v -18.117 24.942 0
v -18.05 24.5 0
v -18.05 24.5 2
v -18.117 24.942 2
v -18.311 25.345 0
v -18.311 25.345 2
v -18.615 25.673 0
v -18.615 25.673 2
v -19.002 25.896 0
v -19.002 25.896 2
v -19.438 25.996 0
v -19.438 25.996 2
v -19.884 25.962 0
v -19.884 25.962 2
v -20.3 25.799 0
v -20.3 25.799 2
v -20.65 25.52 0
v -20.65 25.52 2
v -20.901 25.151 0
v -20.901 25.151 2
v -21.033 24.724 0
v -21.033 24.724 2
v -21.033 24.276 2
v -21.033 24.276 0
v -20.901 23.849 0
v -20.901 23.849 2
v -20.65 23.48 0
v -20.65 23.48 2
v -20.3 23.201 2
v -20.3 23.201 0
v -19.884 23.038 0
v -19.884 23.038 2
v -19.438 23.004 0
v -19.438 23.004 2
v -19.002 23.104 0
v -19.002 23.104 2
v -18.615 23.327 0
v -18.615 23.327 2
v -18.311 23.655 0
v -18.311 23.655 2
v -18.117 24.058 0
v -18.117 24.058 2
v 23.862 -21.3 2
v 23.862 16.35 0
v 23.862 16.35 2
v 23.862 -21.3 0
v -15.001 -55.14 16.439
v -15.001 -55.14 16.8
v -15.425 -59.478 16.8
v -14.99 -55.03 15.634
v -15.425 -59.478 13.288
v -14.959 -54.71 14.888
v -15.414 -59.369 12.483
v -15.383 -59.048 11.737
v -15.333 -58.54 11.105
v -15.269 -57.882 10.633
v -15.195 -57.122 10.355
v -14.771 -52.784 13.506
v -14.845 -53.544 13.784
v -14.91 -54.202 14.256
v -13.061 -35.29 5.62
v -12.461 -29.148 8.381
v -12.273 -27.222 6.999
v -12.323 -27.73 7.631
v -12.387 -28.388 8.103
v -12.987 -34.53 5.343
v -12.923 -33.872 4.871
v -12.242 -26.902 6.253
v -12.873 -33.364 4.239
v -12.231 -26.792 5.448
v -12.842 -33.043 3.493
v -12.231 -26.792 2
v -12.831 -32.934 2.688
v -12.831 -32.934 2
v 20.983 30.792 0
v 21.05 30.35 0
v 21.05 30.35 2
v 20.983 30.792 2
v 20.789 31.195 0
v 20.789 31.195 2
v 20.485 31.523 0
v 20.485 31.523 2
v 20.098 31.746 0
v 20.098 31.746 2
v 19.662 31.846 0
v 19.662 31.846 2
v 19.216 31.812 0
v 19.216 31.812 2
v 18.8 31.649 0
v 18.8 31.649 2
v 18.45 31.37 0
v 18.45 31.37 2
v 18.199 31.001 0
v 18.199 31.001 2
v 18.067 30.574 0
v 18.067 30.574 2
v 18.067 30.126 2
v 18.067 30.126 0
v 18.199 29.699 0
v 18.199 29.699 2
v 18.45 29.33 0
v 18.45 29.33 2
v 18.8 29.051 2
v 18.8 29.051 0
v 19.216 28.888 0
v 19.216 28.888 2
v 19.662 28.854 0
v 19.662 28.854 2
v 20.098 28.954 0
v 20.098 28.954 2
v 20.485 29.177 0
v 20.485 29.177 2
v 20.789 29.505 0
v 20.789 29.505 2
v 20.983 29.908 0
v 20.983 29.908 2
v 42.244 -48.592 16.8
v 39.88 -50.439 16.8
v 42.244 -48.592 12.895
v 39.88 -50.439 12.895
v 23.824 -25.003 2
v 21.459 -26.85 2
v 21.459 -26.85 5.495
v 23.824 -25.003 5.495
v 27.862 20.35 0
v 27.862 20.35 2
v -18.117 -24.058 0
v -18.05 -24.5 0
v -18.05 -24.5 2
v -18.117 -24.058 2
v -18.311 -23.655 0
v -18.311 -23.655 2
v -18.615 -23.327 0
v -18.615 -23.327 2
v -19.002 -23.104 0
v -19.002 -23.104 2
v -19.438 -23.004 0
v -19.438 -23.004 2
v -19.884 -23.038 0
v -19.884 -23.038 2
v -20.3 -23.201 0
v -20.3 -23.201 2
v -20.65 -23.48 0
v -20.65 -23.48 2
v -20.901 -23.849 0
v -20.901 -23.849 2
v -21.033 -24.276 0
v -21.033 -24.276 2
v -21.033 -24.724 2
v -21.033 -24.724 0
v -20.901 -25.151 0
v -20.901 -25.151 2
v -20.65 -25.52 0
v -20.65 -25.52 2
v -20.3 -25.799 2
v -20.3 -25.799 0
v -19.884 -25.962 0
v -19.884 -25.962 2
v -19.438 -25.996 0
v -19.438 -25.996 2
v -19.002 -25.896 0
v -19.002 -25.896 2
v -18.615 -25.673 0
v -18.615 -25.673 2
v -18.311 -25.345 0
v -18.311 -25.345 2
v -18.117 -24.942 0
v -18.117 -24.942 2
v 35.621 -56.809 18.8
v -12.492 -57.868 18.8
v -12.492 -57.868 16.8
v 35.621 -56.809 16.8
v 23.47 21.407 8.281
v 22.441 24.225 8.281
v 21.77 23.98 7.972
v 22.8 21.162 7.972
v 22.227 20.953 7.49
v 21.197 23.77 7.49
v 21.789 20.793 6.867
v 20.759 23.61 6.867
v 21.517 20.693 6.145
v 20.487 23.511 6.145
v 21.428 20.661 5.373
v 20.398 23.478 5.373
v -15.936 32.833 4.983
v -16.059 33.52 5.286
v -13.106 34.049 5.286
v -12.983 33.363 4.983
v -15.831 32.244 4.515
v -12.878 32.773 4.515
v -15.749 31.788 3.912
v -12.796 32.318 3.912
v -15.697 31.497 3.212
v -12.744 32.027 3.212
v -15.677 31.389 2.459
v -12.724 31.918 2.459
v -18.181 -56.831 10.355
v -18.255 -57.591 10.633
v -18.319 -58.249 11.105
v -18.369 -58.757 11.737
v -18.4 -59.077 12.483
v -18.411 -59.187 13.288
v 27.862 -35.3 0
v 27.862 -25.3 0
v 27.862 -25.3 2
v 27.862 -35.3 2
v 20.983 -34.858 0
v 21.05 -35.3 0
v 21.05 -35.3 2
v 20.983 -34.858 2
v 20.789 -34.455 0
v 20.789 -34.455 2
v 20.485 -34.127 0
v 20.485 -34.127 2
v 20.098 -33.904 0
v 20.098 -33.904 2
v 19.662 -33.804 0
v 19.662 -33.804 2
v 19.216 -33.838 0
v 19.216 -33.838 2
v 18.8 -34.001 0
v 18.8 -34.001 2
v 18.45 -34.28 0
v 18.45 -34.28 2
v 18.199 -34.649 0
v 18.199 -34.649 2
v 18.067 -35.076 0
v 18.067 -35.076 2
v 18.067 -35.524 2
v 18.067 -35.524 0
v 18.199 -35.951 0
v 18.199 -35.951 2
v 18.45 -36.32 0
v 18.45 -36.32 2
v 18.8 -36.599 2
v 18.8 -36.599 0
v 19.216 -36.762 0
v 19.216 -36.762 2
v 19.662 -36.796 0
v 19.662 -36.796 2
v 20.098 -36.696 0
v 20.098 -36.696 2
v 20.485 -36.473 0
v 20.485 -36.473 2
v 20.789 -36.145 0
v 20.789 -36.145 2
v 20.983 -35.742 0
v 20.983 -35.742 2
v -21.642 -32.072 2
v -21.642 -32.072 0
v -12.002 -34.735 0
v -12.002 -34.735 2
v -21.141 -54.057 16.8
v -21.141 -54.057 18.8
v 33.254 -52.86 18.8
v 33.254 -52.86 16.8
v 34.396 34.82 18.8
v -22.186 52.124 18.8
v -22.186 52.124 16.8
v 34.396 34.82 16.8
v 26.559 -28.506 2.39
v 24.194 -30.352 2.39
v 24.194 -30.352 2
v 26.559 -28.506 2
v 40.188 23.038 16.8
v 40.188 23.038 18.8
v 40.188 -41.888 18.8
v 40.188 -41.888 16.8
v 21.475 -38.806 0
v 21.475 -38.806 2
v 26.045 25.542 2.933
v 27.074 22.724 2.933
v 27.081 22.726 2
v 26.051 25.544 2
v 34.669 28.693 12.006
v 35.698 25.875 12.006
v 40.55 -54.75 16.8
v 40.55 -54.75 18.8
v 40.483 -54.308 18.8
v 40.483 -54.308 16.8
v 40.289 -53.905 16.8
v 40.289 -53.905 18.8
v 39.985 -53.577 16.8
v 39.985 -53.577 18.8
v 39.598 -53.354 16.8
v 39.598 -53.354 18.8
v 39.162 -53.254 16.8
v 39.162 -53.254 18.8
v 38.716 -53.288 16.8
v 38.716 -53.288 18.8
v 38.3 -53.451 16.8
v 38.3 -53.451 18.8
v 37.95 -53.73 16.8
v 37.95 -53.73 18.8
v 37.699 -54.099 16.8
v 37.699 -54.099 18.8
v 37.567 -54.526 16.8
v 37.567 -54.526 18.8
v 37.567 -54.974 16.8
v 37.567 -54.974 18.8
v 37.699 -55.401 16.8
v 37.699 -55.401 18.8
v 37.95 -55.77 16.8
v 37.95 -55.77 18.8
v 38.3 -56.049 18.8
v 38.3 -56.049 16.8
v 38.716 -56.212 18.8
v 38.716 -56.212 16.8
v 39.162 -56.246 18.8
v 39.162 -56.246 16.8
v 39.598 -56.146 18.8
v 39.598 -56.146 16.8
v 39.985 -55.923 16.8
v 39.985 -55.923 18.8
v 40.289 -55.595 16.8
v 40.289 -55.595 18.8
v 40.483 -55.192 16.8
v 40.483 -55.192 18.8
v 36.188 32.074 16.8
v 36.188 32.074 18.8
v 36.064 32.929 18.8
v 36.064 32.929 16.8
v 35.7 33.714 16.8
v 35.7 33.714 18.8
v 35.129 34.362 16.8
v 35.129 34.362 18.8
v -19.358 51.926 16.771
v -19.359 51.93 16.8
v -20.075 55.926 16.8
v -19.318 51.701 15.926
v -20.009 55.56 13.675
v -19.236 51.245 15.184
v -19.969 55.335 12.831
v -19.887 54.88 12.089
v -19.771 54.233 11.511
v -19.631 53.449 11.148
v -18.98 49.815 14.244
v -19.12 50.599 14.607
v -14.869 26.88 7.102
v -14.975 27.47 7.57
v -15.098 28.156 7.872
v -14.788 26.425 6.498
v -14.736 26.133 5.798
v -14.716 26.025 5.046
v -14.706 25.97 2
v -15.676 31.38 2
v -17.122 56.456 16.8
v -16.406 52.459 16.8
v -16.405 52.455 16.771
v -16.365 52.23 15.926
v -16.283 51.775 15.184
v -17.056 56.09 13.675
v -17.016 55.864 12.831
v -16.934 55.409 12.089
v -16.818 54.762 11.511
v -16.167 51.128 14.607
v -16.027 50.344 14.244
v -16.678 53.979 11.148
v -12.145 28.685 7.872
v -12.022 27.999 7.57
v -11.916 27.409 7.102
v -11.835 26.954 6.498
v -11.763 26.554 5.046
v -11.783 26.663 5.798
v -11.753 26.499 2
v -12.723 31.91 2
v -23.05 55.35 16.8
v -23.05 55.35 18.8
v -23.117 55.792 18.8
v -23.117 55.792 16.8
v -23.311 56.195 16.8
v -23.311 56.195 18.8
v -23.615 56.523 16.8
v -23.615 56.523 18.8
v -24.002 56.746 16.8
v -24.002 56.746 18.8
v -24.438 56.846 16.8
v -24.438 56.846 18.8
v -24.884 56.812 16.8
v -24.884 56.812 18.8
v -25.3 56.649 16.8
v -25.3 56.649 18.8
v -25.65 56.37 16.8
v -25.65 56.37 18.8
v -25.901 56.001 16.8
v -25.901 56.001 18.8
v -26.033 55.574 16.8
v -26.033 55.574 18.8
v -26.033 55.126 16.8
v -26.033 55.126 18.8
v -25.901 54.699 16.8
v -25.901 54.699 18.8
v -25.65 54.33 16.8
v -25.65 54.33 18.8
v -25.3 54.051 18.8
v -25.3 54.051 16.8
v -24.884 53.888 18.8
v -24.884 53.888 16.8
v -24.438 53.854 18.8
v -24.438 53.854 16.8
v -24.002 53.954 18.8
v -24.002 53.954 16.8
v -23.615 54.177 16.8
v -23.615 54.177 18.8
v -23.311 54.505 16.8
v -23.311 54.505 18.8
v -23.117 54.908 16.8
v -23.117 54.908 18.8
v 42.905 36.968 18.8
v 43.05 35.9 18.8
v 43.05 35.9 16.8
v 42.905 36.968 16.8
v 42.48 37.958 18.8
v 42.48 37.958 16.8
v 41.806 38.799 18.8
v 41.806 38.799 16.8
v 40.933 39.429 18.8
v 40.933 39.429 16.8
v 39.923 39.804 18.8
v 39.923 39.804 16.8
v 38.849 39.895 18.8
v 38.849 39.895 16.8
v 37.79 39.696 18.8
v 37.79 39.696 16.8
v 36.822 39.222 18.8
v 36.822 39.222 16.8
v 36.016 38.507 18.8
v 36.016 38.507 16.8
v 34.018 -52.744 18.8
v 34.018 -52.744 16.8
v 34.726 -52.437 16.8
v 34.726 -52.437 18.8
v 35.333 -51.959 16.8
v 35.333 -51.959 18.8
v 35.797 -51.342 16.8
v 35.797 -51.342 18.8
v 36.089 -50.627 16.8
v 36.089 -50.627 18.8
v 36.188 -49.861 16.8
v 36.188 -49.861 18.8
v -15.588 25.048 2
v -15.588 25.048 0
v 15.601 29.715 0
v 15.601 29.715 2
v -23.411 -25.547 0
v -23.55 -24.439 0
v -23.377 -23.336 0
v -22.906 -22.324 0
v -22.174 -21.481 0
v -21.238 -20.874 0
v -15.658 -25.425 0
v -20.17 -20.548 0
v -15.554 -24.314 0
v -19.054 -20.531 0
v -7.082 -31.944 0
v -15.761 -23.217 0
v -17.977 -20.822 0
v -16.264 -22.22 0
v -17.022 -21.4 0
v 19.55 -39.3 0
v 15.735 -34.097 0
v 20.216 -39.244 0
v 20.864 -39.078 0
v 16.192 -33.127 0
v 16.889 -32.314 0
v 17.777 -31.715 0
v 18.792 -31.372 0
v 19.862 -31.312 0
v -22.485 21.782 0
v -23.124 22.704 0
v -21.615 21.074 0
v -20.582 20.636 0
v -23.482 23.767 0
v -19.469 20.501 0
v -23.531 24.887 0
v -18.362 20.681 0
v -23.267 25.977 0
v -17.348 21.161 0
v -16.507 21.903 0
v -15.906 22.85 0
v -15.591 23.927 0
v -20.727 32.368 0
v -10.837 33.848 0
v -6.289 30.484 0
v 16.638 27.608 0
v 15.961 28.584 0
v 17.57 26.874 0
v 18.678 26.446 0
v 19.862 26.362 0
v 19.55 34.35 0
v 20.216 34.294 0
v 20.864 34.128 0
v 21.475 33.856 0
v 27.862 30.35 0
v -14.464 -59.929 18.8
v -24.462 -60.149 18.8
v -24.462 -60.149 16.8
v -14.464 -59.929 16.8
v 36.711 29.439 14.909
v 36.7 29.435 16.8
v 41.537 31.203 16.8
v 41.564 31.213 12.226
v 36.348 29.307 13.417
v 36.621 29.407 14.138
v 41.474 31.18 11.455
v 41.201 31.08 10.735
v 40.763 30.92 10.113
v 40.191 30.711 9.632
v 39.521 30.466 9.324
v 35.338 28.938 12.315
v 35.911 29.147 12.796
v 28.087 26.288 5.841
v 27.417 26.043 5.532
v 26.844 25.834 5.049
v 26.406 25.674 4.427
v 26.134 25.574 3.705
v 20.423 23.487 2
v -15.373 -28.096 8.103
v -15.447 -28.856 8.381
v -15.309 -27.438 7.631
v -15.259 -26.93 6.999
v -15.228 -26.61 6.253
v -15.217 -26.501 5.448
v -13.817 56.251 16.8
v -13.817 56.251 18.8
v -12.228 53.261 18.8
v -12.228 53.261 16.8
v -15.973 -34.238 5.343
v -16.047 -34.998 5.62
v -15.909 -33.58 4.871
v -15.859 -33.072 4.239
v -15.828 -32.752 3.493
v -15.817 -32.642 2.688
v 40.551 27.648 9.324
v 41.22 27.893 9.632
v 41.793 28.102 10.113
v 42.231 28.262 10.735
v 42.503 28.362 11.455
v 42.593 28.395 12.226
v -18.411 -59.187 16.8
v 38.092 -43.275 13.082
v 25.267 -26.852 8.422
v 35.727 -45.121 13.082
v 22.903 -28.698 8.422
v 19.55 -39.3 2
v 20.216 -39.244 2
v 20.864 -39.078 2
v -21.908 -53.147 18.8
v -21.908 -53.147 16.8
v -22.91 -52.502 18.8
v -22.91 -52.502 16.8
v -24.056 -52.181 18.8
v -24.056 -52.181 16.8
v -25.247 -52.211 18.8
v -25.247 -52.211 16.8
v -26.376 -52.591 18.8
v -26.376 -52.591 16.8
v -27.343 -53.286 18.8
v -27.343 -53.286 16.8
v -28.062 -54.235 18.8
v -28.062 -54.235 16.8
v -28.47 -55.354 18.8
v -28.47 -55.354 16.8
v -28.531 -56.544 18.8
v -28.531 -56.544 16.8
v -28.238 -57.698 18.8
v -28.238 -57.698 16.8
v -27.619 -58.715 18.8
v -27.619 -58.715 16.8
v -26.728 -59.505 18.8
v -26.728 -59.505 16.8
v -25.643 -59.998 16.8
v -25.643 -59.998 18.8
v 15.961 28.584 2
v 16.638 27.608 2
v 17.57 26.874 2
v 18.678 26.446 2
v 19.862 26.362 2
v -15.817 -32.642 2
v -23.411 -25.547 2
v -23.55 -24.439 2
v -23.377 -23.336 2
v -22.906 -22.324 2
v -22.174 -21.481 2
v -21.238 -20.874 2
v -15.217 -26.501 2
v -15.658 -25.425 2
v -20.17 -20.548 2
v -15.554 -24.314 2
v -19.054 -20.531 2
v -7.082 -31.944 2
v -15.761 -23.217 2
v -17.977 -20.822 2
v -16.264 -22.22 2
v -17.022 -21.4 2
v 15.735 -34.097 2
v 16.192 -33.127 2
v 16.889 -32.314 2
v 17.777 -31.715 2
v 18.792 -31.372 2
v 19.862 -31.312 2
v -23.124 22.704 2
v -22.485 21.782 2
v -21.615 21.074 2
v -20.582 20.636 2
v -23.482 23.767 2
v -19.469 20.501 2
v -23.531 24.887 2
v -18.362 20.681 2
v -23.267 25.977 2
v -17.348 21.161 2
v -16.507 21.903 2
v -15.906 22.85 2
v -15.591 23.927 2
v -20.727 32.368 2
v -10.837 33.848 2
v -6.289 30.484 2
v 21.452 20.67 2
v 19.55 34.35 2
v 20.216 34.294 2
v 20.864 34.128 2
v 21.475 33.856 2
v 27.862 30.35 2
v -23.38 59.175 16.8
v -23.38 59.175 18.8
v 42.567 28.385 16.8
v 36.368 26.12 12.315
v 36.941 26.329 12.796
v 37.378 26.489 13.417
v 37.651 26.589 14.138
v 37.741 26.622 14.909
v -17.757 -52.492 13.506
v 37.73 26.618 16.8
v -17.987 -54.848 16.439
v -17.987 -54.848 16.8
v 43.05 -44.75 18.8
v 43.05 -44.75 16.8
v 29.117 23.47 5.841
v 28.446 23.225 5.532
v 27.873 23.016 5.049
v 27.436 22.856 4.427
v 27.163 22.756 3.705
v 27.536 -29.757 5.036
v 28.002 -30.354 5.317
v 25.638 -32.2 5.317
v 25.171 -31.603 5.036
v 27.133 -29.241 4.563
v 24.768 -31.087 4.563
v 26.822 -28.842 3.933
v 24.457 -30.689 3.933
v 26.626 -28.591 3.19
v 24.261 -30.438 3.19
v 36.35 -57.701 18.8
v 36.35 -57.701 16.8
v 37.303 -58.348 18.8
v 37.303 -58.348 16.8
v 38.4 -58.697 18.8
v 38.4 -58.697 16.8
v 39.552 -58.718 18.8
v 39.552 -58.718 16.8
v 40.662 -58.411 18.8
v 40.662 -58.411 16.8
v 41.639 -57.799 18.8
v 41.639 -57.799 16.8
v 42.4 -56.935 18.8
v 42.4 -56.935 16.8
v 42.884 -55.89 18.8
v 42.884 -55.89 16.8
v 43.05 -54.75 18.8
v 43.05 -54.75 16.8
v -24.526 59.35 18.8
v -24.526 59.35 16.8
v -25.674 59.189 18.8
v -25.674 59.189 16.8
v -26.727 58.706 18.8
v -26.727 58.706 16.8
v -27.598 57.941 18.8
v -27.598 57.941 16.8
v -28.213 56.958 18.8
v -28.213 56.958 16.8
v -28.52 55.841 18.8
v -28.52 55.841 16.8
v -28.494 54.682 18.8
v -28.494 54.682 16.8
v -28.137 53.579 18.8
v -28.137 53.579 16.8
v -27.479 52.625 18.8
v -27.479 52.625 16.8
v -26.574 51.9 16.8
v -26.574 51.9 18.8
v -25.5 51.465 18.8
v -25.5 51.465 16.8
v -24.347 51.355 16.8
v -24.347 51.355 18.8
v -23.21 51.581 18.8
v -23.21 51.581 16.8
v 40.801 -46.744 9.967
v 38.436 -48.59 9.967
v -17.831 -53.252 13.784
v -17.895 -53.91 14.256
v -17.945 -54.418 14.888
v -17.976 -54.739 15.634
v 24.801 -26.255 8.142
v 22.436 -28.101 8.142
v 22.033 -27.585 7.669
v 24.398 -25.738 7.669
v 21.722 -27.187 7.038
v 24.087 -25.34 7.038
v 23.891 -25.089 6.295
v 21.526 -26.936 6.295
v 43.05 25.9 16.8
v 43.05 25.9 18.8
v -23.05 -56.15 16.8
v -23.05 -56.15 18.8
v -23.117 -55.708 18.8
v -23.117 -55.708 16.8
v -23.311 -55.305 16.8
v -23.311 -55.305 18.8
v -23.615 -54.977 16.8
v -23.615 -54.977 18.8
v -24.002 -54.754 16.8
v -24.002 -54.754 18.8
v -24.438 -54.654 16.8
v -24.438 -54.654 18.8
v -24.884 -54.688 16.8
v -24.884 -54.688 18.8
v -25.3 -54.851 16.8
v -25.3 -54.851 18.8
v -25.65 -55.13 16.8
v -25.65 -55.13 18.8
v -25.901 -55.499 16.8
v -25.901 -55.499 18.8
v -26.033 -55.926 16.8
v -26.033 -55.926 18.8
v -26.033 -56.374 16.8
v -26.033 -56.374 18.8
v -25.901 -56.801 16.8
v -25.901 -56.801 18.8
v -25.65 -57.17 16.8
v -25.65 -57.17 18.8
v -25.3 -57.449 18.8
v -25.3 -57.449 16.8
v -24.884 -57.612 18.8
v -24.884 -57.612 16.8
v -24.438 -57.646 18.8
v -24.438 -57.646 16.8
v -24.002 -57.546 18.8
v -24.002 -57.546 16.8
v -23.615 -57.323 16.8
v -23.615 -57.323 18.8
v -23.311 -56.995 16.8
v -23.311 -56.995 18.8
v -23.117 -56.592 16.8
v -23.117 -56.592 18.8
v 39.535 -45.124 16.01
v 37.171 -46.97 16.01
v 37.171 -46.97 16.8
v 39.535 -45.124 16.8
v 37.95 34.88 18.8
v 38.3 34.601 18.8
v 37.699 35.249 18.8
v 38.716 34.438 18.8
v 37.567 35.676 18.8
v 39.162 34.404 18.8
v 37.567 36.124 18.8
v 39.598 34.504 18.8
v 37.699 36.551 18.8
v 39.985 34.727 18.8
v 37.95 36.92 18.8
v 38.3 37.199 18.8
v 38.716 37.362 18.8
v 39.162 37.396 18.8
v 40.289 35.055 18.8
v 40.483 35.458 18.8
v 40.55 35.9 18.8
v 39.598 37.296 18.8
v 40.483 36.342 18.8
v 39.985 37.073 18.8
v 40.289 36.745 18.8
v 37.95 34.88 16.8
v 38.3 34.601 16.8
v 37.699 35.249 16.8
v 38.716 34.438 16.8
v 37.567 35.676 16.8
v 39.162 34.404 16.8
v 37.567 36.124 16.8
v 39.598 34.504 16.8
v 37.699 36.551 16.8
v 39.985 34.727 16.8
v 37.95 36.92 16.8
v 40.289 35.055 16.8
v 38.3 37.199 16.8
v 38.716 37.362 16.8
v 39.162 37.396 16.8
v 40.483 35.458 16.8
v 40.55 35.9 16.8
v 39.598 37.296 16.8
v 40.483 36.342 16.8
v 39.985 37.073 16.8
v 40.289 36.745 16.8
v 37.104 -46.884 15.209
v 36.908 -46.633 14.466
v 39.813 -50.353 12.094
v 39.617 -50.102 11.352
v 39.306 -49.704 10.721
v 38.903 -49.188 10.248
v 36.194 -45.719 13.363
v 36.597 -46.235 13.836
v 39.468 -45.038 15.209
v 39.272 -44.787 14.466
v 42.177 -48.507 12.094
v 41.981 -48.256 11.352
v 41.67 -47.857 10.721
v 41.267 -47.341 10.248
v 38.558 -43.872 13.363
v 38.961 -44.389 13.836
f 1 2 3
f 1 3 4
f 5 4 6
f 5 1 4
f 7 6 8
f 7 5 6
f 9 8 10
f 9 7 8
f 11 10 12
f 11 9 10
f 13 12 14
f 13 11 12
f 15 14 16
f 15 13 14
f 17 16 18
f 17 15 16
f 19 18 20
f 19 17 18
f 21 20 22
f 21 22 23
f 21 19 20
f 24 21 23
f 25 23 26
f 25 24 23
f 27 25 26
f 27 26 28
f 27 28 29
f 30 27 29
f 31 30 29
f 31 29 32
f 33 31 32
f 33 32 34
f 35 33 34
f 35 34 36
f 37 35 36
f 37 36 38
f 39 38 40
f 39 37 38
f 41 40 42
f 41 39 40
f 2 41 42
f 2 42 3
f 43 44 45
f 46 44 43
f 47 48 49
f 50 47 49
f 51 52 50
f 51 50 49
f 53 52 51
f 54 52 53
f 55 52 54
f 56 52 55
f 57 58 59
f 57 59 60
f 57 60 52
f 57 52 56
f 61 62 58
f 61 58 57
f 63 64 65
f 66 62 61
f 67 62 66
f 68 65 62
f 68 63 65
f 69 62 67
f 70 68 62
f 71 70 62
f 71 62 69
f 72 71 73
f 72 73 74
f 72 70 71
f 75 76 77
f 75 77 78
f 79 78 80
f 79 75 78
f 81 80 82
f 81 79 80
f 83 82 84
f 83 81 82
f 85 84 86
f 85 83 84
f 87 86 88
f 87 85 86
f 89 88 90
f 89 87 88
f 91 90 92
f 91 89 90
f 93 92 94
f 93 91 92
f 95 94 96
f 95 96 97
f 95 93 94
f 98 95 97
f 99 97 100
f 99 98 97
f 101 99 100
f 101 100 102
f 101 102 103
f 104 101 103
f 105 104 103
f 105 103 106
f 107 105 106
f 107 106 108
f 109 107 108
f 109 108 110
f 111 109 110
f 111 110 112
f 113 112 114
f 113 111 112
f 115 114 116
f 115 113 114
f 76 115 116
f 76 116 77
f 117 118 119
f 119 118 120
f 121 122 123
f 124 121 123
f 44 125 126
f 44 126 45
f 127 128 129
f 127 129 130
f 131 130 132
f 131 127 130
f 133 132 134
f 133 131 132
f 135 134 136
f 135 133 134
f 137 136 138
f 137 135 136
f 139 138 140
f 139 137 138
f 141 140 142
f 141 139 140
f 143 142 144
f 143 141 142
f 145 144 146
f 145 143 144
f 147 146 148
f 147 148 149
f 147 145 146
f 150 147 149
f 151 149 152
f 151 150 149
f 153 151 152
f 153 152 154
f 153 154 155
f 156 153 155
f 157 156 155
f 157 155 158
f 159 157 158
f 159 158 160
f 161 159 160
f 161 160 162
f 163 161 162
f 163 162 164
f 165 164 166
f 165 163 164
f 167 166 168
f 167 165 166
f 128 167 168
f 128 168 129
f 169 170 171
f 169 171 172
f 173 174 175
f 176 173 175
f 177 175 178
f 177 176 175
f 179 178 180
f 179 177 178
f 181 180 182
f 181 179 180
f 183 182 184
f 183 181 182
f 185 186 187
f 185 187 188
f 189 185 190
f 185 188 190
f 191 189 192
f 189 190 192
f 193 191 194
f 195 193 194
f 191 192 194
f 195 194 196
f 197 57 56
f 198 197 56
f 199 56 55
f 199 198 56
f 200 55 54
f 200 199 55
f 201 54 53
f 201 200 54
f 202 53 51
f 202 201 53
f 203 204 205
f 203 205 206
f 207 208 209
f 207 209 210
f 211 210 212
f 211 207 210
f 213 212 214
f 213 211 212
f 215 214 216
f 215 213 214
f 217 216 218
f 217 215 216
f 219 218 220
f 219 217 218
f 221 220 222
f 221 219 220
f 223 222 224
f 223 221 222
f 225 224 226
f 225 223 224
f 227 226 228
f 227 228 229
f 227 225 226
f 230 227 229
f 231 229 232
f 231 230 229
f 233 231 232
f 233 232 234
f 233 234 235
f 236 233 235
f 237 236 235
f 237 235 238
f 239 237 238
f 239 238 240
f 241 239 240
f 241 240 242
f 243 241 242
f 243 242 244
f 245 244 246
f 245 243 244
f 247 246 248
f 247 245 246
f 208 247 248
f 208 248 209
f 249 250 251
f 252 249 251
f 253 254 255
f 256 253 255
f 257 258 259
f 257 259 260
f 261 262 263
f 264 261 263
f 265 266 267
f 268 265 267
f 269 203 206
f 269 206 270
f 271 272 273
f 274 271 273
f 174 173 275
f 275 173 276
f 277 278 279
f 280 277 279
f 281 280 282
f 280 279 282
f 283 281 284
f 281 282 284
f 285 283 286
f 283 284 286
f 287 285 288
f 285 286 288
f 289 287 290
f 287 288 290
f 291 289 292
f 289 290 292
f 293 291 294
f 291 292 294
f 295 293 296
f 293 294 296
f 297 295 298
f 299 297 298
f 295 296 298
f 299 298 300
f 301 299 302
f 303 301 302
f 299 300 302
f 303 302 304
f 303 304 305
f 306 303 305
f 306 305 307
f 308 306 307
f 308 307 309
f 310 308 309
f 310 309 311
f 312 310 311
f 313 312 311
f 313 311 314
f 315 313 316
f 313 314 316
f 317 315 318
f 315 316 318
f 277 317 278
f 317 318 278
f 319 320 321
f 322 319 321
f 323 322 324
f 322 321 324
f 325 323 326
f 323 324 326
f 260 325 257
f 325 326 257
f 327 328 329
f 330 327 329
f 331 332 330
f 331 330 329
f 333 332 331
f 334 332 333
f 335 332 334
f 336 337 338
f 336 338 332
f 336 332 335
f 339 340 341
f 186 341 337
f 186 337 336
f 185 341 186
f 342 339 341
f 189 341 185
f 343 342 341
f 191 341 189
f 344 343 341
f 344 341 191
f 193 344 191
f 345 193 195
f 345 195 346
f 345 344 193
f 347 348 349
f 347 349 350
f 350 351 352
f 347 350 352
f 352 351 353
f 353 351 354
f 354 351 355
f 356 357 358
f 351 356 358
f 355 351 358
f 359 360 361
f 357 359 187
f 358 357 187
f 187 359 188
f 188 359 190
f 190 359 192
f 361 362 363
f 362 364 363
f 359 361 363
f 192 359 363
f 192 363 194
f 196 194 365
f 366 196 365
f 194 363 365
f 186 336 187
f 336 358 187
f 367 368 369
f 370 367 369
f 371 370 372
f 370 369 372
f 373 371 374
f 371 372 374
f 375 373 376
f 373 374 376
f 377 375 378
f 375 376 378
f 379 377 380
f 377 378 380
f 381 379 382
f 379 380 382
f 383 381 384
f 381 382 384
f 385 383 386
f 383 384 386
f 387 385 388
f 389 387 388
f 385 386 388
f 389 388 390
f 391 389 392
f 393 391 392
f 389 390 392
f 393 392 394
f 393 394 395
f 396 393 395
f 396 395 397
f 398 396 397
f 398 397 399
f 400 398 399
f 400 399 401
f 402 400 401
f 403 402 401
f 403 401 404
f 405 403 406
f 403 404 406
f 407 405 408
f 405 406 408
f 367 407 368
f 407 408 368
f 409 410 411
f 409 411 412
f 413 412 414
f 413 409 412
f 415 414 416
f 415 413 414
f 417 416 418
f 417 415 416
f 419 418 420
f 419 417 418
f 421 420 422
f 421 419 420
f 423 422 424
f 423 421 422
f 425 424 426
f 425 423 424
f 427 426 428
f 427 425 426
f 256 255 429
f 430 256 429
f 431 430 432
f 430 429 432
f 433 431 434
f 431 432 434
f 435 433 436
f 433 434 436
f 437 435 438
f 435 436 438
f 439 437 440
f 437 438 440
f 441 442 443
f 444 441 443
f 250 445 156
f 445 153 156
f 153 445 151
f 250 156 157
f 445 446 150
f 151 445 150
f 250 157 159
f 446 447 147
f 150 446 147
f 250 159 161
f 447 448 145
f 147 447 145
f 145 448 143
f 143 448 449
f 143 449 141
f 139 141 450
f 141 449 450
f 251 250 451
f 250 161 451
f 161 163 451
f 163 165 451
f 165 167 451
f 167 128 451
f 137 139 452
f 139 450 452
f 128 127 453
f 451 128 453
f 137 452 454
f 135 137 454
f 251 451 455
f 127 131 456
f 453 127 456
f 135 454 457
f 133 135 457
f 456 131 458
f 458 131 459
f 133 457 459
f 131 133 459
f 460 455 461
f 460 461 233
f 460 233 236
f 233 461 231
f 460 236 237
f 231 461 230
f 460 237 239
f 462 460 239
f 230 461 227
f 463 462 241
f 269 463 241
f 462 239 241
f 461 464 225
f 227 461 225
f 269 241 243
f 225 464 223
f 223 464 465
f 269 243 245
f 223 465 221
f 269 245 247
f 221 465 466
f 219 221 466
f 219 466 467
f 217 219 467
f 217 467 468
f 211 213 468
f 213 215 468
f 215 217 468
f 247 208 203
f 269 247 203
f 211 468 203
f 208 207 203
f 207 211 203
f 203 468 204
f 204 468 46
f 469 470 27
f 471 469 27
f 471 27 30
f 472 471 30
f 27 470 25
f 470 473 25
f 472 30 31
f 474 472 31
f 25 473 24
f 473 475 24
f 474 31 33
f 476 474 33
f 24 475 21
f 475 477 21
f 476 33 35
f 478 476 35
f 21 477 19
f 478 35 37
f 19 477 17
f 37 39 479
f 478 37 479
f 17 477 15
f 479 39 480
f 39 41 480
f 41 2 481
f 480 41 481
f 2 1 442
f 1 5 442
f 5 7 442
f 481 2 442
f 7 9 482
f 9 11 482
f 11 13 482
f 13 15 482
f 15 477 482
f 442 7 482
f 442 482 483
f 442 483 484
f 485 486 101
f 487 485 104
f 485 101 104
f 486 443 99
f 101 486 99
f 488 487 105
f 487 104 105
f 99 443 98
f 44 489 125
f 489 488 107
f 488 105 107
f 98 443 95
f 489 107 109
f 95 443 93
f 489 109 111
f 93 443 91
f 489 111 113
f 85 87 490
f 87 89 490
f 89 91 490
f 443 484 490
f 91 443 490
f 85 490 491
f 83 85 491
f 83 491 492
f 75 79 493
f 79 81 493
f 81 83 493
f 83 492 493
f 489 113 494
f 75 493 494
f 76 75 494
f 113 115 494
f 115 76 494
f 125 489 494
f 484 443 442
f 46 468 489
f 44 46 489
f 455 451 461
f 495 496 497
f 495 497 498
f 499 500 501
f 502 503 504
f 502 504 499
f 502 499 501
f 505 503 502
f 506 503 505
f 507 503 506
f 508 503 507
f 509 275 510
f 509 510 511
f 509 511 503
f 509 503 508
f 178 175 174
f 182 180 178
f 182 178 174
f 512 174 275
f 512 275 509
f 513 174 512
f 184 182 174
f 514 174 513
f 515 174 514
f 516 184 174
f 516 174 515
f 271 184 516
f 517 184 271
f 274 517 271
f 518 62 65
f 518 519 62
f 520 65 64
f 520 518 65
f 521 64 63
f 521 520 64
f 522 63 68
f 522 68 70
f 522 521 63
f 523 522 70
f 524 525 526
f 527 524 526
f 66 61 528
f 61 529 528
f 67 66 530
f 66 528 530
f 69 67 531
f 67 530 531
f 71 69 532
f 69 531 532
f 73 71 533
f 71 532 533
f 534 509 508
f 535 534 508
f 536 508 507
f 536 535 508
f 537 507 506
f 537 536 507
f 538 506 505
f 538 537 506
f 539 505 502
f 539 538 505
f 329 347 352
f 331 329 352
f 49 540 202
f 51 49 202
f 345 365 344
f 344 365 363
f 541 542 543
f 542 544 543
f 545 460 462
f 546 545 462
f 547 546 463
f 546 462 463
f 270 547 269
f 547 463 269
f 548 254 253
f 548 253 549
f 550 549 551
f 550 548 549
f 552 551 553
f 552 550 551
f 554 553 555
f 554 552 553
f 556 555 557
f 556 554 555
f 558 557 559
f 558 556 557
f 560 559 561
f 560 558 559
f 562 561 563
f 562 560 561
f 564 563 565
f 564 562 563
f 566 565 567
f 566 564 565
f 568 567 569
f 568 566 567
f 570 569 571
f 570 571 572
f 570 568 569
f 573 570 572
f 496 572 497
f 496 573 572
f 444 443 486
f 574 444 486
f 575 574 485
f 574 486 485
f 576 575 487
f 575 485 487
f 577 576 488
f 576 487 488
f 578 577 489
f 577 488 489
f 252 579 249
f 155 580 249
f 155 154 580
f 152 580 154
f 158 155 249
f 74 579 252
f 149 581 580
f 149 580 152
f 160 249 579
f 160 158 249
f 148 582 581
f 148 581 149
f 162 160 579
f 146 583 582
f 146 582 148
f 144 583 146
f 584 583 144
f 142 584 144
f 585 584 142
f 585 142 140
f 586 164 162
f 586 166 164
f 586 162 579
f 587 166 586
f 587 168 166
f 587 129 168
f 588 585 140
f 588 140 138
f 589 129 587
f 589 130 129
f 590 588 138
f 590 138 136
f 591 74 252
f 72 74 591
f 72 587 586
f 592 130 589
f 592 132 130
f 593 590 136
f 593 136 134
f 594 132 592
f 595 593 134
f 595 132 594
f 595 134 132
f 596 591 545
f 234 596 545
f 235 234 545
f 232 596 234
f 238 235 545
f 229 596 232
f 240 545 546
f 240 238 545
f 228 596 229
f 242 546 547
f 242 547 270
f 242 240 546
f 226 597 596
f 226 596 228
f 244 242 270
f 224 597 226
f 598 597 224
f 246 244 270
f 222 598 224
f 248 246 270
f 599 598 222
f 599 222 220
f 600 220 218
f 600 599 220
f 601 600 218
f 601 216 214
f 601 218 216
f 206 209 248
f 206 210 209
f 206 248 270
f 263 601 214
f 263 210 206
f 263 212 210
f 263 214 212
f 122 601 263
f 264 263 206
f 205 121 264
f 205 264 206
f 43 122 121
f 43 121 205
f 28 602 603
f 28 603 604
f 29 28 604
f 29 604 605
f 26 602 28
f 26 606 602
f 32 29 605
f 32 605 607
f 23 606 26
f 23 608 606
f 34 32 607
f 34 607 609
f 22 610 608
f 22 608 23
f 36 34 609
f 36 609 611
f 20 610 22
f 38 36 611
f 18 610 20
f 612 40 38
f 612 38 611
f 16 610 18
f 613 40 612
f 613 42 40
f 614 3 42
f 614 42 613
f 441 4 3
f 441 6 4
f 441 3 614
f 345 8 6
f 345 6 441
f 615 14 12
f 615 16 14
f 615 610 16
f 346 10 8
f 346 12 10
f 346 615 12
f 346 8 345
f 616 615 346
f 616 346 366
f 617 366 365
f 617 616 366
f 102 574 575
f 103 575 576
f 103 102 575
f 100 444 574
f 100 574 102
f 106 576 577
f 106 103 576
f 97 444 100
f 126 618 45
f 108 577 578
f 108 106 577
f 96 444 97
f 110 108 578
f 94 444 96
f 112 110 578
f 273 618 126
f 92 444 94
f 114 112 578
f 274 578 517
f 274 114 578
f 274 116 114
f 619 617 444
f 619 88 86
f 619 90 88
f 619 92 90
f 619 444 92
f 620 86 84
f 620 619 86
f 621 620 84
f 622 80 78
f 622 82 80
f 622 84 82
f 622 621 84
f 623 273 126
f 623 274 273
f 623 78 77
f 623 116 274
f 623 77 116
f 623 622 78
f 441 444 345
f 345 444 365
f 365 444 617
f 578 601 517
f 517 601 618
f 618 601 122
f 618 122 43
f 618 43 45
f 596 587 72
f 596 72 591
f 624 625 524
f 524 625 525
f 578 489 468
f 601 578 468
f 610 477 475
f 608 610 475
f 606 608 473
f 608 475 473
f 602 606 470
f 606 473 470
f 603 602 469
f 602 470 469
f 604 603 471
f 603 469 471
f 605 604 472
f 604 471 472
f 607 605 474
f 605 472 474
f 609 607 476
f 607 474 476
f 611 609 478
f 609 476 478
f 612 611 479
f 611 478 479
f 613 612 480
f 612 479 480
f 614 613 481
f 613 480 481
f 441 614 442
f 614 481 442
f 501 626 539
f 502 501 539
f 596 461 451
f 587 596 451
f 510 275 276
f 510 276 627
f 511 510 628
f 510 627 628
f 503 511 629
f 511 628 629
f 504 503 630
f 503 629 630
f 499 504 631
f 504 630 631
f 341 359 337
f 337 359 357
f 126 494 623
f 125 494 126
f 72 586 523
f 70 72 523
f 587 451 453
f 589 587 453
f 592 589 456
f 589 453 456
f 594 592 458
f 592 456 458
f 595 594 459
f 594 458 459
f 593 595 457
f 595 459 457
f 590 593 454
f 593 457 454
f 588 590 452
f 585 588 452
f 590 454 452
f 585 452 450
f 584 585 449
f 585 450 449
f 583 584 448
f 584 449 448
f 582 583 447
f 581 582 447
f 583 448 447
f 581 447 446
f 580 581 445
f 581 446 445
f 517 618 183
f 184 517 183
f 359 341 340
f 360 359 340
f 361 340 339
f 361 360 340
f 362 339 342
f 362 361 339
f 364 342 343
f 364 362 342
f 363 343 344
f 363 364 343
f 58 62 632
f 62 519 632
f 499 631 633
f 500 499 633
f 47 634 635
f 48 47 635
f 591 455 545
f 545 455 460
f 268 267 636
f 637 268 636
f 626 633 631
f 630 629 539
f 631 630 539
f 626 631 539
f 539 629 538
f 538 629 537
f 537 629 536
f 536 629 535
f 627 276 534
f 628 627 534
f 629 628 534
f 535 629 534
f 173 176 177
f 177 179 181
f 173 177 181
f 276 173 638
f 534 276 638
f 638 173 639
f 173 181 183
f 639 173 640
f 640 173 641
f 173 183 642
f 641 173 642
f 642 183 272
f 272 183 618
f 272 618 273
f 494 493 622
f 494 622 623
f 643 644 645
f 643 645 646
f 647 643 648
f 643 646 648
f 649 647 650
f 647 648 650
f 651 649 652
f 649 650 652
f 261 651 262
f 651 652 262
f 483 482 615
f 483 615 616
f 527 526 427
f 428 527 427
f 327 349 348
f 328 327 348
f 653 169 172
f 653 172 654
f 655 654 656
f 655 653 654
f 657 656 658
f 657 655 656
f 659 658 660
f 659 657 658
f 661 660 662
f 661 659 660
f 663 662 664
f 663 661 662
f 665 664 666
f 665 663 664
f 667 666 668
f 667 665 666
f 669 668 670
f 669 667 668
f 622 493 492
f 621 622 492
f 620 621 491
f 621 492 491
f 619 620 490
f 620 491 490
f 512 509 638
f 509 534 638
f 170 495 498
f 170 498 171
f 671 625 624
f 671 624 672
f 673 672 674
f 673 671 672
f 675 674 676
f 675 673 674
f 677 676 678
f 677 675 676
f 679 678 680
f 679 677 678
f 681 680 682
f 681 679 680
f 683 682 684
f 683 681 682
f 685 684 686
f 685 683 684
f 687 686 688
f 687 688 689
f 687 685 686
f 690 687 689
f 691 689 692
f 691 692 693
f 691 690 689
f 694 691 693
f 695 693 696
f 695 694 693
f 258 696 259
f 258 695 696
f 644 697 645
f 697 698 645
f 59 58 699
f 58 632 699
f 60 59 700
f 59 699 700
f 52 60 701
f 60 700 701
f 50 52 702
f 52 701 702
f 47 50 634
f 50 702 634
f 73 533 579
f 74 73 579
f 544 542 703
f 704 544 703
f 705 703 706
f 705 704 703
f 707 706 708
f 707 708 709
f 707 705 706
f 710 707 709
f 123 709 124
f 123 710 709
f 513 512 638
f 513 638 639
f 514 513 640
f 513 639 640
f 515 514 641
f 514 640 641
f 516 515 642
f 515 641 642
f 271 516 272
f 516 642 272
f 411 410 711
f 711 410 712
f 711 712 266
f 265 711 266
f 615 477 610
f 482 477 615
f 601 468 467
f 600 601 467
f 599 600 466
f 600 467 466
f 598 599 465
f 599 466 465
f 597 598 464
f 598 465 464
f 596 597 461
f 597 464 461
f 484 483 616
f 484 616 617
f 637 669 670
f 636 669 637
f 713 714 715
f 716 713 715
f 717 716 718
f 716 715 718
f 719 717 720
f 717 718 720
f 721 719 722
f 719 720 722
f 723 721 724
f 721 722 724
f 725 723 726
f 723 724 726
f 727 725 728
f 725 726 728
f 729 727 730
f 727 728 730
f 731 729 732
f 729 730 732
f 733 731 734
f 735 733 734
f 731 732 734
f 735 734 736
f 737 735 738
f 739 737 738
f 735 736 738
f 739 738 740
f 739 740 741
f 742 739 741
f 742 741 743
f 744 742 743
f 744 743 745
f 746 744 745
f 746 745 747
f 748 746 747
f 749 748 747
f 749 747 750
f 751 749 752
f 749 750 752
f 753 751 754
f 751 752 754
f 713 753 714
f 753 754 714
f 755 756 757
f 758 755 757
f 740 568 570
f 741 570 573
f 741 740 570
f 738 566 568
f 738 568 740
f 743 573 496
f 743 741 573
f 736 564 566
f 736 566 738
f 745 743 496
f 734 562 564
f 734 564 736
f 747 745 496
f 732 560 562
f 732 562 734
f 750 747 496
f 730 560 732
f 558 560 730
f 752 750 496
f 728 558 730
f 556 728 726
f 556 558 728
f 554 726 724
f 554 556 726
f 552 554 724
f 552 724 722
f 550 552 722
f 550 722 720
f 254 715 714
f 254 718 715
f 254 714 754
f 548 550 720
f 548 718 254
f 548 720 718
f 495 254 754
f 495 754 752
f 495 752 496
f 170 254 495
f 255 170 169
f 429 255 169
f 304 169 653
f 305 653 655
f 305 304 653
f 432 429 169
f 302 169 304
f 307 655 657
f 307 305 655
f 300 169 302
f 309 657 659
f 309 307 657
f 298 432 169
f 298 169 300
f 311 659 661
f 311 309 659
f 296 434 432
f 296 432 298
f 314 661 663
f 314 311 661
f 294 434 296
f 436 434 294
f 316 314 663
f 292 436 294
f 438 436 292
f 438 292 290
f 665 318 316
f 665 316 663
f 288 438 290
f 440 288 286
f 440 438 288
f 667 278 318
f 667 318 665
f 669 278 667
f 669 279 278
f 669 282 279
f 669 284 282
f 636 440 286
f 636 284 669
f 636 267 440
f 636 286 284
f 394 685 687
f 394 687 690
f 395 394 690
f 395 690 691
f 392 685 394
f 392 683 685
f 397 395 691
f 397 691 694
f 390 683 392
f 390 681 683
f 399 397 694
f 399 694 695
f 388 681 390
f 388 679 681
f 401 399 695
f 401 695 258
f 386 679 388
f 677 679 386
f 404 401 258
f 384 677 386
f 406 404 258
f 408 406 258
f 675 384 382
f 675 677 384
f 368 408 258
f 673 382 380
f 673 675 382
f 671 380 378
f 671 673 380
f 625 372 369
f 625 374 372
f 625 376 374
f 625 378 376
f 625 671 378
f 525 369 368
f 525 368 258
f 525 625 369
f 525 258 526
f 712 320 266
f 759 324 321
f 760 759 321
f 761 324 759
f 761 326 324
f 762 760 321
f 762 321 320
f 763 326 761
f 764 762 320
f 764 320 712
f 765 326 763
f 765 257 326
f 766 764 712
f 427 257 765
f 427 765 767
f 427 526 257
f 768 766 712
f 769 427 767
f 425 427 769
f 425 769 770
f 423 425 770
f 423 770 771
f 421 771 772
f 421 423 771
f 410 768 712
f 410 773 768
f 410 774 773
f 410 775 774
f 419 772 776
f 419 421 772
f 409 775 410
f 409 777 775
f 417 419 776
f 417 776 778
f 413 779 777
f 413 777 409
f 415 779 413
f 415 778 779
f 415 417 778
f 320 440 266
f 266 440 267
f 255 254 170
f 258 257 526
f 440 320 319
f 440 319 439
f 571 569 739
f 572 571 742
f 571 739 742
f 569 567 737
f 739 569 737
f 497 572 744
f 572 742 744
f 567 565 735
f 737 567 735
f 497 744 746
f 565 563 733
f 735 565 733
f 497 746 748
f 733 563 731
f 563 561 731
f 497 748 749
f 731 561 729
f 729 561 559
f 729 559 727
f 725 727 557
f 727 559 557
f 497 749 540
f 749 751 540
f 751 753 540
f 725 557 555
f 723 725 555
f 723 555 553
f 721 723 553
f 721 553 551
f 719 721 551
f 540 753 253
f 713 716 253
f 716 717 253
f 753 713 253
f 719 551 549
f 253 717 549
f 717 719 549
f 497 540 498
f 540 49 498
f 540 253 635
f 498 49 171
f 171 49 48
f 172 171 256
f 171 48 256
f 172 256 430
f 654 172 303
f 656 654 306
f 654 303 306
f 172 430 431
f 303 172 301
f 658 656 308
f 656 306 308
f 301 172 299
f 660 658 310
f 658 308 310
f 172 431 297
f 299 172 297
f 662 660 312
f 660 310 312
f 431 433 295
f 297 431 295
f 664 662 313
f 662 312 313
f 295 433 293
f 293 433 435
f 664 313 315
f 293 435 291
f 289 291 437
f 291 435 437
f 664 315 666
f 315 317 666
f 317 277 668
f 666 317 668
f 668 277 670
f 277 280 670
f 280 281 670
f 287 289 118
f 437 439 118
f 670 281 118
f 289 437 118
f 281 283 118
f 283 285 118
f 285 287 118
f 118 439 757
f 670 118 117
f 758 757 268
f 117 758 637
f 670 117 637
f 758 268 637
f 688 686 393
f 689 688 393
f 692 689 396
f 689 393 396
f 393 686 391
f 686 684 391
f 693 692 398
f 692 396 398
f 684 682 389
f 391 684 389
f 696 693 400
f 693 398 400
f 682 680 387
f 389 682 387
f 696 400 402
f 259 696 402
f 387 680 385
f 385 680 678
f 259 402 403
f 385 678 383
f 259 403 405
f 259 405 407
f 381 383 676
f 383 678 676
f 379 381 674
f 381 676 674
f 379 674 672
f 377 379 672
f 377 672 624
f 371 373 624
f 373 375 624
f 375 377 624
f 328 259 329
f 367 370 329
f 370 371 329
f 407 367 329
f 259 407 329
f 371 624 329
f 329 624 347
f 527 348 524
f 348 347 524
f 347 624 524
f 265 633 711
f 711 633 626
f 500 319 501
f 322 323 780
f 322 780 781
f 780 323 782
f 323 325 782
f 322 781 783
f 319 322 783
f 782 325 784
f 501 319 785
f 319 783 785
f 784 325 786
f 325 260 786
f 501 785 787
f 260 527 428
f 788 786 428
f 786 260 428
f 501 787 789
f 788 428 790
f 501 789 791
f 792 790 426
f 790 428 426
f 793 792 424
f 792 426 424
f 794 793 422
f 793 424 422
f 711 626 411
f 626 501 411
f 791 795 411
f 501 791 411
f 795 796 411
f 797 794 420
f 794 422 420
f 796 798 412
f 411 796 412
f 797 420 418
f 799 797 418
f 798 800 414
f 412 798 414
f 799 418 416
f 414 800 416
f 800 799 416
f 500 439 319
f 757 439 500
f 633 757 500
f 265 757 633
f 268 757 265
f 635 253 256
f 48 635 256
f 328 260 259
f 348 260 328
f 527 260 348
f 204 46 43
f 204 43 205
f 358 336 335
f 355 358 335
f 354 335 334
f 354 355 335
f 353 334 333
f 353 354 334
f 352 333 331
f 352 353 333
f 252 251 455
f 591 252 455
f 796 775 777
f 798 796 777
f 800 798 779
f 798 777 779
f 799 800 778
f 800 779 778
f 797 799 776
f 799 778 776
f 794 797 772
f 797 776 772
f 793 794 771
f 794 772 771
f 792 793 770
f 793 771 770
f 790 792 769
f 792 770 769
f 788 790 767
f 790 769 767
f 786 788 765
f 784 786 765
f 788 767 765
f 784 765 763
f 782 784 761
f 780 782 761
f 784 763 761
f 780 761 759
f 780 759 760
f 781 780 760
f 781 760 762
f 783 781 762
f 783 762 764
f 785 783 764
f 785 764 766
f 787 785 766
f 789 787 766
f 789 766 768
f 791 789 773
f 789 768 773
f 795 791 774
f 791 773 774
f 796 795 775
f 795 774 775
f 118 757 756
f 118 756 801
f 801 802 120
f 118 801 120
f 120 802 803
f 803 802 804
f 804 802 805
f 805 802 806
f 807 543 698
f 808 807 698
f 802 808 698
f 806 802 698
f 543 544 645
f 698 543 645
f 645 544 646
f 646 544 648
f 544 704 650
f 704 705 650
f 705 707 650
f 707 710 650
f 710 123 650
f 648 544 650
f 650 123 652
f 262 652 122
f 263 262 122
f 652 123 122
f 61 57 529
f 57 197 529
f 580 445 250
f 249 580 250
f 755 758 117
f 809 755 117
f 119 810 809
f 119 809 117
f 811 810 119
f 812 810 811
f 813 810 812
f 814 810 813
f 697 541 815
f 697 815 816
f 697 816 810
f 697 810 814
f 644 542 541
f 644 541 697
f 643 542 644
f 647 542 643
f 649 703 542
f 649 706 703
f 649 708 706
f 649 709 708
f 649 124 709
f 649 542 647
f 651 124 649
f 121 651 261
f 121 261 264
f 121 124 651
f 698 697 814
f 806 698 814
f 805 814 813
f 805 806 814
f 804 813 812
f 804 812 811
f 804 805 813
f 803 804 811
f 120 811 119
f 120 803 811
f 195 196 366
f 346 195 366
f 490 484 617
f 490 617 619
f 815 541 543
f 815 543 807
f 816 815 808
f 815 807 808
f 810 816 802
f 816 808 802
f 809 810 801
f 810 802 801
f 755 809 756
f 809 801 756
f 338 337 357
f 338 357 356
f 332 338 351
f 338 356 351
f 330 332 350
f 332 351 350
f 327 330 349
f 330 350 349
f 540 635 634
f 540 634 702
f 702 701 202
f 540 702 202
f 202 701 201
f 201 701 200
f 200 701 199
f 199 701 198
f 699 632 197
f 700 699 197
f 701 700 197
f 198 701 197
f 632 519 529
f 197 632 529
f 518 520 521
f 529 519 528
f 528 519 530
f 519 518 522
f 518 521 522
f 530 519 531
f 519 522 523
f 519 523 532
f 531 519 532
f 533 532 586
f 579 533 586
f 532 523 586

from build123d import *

# Parameters (mm, degrees)
PAD005_DEPTH = 1.5
PAD004_DEPTH = 1.5
PAD003_DEPTH = 1.5
PAD002_DEPTH = 1.5
SKETCH001_R  = 1.5
PAD001_DEPTH = 2
SKETCH_R     = 1.5
PAD_DEPTH    = 2


with BuildPart() as body005:
    # Sketch007 (on DatumPlane) → Pad005 (new body, symmetric)
    with BuildSketch(Plane(origin=(-16.952542, -59.685824, 18.8), x_dir=(0.053778, 0.550339, 0.833207), z_dir=(-0.99526, 0.097254, 0))):
        with BuildLine():
            Line((4.207597, 37.049782), (7.231669, 35.042847))
            ThreePointArc((8.366132, 31.449048), (8.433631, 33.446315), (7.231669, 35.042847))
            Line((8.366132, 31.449048), (-0.494965, 8.82738))
            ThreePointArc((-0.494965, 8.82738), (-0.562464, 6.830114), (0.639498, 5.233582))
            Line((0.639498, 5.233582), (1.08157, 4.940199))
            Line((1.08157, 4.940199), (-1.328872, 1.308117))
            Line((-1.328872, 1.308117), (-4.396585, 3.344014))
            ThreePointArc((-5.531049, 6.937813), (-5.598548, 4.940547), (-4.396585, 3.344014))
            Line((-5.531049, 6.937813), (2.654091, 27.833816))
            ThreePointArc((2.654091, 27.833816), (2.72159, 29.831082), (1.519628, 31.427615))
            Line((1.519628, 31.427615), (0.795403, 31.908248))
            Line((0.795403, 31.908248), (4.207597, 37.049782))
        make_face()
    extrude(amount=PAD005_DEPTH, both=True)


with BuildPart() as body004:
    # Sketch006 (on DatumPlane) → Pad004 (new body, symmetric)
    with BuildSketch(Plane(origin=(39.503273, -47.519607, 18.8), x_dir=(-0.346354, 0.443537, 0.826628), z_dir=(-0.788162, -0.615468, 0))):
        with BuildLine():
            Line((0.144699, 33.044069), (4.41891, 30.134283))
            ThreePointArc((5.519197, 26.54802), (5.598713, 28.534335), (4.41891, 30.134283))
            Line((5.519197, 26.54802), (-2.355235, 6.701201))
            ThreePointArc((-2.355235, 6.701201), (-2.434751, 4.714886), (-1.254948, 3.114938))
            Line((-1.254948, 3.114938), (0.091634, 2.198216))
            Line((0.091634, 2.198216), (-2.385169, -1.439983))
            Line((-2.385169, -1.439983), (-6.306361, 1.229475))
            ThreePointArc((-7.406648, 4.815738), (-7.486164, 2.829423), (-6.306361, 1.229475))
            Line((-7.406648, 4.815738), (0.451851, 24.622399))
            ThreePointArc((0.451851, 24.622399), (0.531367, 26.608714), (-0.648436, 28.208662))
            Line((-0.648436, 28.208662), (-2.355831, 29.371017))
            Line((-2.355831, 29.371017), (0.144699, 33.044069))
        make_face()
    extrude(amount=PAD004_DEPTH, both=True)


with BuildPart() as body003:
    # Sketch005 (on DatumPlane) → Pad003 (new body, symmetric)
    with BuildSketch(Plane(origin=(41.677137, 29.657026, 18.8), x_dir=(-0.67671, -0.247278, 0.693482), z_dir=(0.343216, -0.939257, 0))):
        with BuildLine():
            Line((4.151211, 27.525873), (6.616561, 25.004493))
            ThreePointArc((7.066271, 21.401359), (7.448444, 23.27869), (6.616561, 25.004493))
            Line((7.066271, 21.401359), (0.269525, 9.689346))
            ThreePointArc((0.269525, 9.689346), (-0.112963, 7.814558), (0.715657, 6.089879))
            Line((0.715657, 6.089879), (2.232289, 4.53347))
            Line((2.232289, 4.53347), (-1.455914, 0.939527))
            Line((-1.455914, 0.939527), (-4.866698, 4.439767))
            ThreePointArc((-5.31283, 8.039234), (-5.695319, 6.164446), (-4.866698, 4.439767))
            Line((-5.31283, 8.039234), (1.04248, 18.990574))
            ThreePointArc((1.04248, 18.990574), (1.424653, 20.867905), (0.59277, 22.593708))
            Line((0.59277, 22.593708), (-0.133446, 23.336429))
            Line((-0.133446, 23.336429), (4.151211, 27.525873))
        make_face()
    extrude(amount=PAD003_DEPTH, both=True)


with BuildPart() as body002:
    # Sketch004 (on DatumPlane) → Pad002 (new body, symmetric)
    with BuildSketch(Plane(origin=(-18.553723, 55.942029, 16.8), x_dir=(0.089809, -0.501127, 0.860701), z_dir=(0.984318, 0.176404, 0))):
        with BuildLine():
            Line((1.898285, 33.961279), (5.220075, 31.912664))
            ThreePointArc((6.550331, 28.610308), (6.428026, 30.480147), (5.220075, 31.912664))
            Line((6.550331, 28.610308), (0.831685, 6.427524))
            ThreePointArc((0.831685, 6.427524), (0.901463, 4.698108), (1.914982, 3.295067))
            Line((1.914982, 3.295067), (2.353125, 2.960199))
            Line((2.353125, 2.960199), (-0.095233, -0.243246))
            Line((-0.095233, -0.243246), (-2.628776, 1.693113))
            ThreePointArc((-3.712073, 4.82557), (-3.642295, 3.096155), (-2.628776, 1.693113))
            Line((-3.712073, 4.82557), (1.549904, 25.236924))
            ThreePointArc((1.549904, 25.236924), (1.427599, 27.106762), (0.219648, 28.53928))
            Line((0.219648, 28.53928), (-0.986732, 29.283279))
            Line((-0.986732, 29.283279), (1.898285, 33.961279))
        make_face()
    extrude(amount=PAD002_DEPTH, both=True)


with BuildPart() as top:
    # Sketch001 → Pad001 (new body)
    with BuildSketch(Plane.XY.offset(18.8)):
        with BuildLine():
            Line((36.188295, 32.073721), (36.188295, -49.860845))
            ThreePointArc((33.254317, -52.860118), (35.33283, -51.958693), (36.188295, -49.860845))
            Line((-21.140977, -54.057499), (33.254317, -52.860118))
            ThreePointArc((-21.140977, -54.057499), (-28.061985, -54.235329), (-24.461971, -60.149031))
            Line((-24.461971, -60.149031), (-14.464393, -59.928959))
            Line((-14.464393, -59.928959), (-12.492298, -57.868088))
            Line((-12.492298, -57.868088), (35.620638, -56.808998))
            ThreePointArc((35.620638, -56.808998), (40.118305, -58.604702), (43.05, -54.75))
            Line((43.05, -54.75), (43.05, -44.75))
            Line((40.188295, -41.888295), (43.05, -44.75))
            Line((40.188295, 23.038295), (40.188295, -41.888295))
            Line((43.05, 25.9), (40.188295, 23.038295))
            Line((43.05, 35.9), (43.05, 25.9))
            ThreePointArc((43.05, 35.9), (40.440305, 39.650607), (36.016474, 38.507244))
            Line((-12.22825, 53.261331), (36.016474, 38.507244))
            Line((-13.817394, 56.250649), (-12.22825, 53.261331))
            Line((-23.380209, 59.175126), (-13.817394, 56.250649))
            ThreePointArc((-23.380209, 59.175126), (-28.493807, 54.681881), (-22.185612, 52.123598))
            Line((-22.185612, 52.123598), (34.395591, 34.82007))
            ThreePointArc((36.188295, 32.073721), (35.700454, 33.713555), (34.395591, 34.82007))
        make_face()
        with Locations((-24.55, 55.35)):
            Circle(SKETCH001_R, mode=Mode.SUBTRACT)
        with Locations((39.05, 35.9)):
            Circle(SKETCH001_R, mode=Mode.SUBTRACT)
        with Locations((39.05, -54.75)):
            Circle(SKETCH001_R, mode=Mode.SUBTRACT)
        with Locations((-24.55, -56.15)):
            Circle(SKETCH001_R, mode=Mode.SUBTRACT)
    extrude(amount=-PAD001_DEPTH)


with BuildPart() as fusion004:
    # Sketch → Pad (new body)
    with BuildSketch(Plane.XY):
        with BuildLine():
            Line((-15.587757, 25.048294), (15.600787, 29.714611))
            ThreePointArc((15.600787, 29.714611), (17.07661, 27.20638), (19.861672, 26.362161))
            Line((19.861672, 26.362161), (19.861672, -31.312161))
            ThreePointArc((19.861672, -31.312161), (17.312602, -31.984272), (15.735331, -34.096547))
            Line((15.735331, -34.096547), (-15.658451, -25.425119))
            ThreePointArc((-15.658451, -25.425119), (-19.612693, -20.500491), (-23.410642, -25.546635))
            Line((-23.410642, -25.546635), (-21.64152, -32.072076))
            Line((-21.64152, -32.072076), (-12.002466, -34.734526))
            Line((-12.002466, -34.734526), (-7.081864, -31.943884))
            Line((-7.081864, -31.943884), (19.55, -39.3))
            ThreePointArc((19.55, -39.3), (20.543648, -39.174618), (21.475002, -38.806332))
            Line((27.861672, -35.3), (21.475002, -38.806332))
            Line((27.861672, -25.3), (27.861672, -35.3))
            Line((23.861672, -21.3), (27.861672, -25.3))
            Line((23.861672, 16.35), (23.861672, -21.3))
            Line((27.861672, 20.35), (23.861672, 16.35))
            Line((27.861672, 30.35), (27.861672, 20.35))
            Line((21.475001, 33.856333), (27.861672, 30.35))
            ThreePointArc((21.475001, 33.856333), (20.543647, 34.224618), (19.55, 34.35))
            Line((-6.289475, 30.483992), (19.55, 34.35))
            Line((-10.83732, 33.848082), (-6.289475, 30.483992))
            Line((-20.72724, 32.368388), (-10.83732, 33.848082))
            Line((-23.267202, 25.977299), (-20.72724, 32.368388))
            ThreePointArc((-23.267202, 25.977299), (-20.030389, 20.528952), (-15.587757, 25.048294))
        make_face()
        with Locations((-19.55, 24.5)):
            Circle(SKETCH_R, mode=Mode.SUBTRACT)
        with Locations((19.55, 30.35)):
            Circle(SKETCH_R, mode=Mode.SUBTRACT)
        with Locations((19.55, -35.3)):
            Circle(SKETCH_R, mode=Mode.SUBTRACT)
        with Locations((-19.55, -24.5)):
            Circle(SKETCH_R, mode=Mode.SUBTRACT)
    extrude(amount=PAD_DEPTH)

    # Fusion: union top
    add(top.part)

    # Fusion001: union Body002
    add(body002.part)

    # Fusion002: union Body003
    add(body003.part)

    # Fusion003: union Body004
    add(body004.part)

    # Fusion004: union Body005
    add(body005.part)


solid = fusion004.part
